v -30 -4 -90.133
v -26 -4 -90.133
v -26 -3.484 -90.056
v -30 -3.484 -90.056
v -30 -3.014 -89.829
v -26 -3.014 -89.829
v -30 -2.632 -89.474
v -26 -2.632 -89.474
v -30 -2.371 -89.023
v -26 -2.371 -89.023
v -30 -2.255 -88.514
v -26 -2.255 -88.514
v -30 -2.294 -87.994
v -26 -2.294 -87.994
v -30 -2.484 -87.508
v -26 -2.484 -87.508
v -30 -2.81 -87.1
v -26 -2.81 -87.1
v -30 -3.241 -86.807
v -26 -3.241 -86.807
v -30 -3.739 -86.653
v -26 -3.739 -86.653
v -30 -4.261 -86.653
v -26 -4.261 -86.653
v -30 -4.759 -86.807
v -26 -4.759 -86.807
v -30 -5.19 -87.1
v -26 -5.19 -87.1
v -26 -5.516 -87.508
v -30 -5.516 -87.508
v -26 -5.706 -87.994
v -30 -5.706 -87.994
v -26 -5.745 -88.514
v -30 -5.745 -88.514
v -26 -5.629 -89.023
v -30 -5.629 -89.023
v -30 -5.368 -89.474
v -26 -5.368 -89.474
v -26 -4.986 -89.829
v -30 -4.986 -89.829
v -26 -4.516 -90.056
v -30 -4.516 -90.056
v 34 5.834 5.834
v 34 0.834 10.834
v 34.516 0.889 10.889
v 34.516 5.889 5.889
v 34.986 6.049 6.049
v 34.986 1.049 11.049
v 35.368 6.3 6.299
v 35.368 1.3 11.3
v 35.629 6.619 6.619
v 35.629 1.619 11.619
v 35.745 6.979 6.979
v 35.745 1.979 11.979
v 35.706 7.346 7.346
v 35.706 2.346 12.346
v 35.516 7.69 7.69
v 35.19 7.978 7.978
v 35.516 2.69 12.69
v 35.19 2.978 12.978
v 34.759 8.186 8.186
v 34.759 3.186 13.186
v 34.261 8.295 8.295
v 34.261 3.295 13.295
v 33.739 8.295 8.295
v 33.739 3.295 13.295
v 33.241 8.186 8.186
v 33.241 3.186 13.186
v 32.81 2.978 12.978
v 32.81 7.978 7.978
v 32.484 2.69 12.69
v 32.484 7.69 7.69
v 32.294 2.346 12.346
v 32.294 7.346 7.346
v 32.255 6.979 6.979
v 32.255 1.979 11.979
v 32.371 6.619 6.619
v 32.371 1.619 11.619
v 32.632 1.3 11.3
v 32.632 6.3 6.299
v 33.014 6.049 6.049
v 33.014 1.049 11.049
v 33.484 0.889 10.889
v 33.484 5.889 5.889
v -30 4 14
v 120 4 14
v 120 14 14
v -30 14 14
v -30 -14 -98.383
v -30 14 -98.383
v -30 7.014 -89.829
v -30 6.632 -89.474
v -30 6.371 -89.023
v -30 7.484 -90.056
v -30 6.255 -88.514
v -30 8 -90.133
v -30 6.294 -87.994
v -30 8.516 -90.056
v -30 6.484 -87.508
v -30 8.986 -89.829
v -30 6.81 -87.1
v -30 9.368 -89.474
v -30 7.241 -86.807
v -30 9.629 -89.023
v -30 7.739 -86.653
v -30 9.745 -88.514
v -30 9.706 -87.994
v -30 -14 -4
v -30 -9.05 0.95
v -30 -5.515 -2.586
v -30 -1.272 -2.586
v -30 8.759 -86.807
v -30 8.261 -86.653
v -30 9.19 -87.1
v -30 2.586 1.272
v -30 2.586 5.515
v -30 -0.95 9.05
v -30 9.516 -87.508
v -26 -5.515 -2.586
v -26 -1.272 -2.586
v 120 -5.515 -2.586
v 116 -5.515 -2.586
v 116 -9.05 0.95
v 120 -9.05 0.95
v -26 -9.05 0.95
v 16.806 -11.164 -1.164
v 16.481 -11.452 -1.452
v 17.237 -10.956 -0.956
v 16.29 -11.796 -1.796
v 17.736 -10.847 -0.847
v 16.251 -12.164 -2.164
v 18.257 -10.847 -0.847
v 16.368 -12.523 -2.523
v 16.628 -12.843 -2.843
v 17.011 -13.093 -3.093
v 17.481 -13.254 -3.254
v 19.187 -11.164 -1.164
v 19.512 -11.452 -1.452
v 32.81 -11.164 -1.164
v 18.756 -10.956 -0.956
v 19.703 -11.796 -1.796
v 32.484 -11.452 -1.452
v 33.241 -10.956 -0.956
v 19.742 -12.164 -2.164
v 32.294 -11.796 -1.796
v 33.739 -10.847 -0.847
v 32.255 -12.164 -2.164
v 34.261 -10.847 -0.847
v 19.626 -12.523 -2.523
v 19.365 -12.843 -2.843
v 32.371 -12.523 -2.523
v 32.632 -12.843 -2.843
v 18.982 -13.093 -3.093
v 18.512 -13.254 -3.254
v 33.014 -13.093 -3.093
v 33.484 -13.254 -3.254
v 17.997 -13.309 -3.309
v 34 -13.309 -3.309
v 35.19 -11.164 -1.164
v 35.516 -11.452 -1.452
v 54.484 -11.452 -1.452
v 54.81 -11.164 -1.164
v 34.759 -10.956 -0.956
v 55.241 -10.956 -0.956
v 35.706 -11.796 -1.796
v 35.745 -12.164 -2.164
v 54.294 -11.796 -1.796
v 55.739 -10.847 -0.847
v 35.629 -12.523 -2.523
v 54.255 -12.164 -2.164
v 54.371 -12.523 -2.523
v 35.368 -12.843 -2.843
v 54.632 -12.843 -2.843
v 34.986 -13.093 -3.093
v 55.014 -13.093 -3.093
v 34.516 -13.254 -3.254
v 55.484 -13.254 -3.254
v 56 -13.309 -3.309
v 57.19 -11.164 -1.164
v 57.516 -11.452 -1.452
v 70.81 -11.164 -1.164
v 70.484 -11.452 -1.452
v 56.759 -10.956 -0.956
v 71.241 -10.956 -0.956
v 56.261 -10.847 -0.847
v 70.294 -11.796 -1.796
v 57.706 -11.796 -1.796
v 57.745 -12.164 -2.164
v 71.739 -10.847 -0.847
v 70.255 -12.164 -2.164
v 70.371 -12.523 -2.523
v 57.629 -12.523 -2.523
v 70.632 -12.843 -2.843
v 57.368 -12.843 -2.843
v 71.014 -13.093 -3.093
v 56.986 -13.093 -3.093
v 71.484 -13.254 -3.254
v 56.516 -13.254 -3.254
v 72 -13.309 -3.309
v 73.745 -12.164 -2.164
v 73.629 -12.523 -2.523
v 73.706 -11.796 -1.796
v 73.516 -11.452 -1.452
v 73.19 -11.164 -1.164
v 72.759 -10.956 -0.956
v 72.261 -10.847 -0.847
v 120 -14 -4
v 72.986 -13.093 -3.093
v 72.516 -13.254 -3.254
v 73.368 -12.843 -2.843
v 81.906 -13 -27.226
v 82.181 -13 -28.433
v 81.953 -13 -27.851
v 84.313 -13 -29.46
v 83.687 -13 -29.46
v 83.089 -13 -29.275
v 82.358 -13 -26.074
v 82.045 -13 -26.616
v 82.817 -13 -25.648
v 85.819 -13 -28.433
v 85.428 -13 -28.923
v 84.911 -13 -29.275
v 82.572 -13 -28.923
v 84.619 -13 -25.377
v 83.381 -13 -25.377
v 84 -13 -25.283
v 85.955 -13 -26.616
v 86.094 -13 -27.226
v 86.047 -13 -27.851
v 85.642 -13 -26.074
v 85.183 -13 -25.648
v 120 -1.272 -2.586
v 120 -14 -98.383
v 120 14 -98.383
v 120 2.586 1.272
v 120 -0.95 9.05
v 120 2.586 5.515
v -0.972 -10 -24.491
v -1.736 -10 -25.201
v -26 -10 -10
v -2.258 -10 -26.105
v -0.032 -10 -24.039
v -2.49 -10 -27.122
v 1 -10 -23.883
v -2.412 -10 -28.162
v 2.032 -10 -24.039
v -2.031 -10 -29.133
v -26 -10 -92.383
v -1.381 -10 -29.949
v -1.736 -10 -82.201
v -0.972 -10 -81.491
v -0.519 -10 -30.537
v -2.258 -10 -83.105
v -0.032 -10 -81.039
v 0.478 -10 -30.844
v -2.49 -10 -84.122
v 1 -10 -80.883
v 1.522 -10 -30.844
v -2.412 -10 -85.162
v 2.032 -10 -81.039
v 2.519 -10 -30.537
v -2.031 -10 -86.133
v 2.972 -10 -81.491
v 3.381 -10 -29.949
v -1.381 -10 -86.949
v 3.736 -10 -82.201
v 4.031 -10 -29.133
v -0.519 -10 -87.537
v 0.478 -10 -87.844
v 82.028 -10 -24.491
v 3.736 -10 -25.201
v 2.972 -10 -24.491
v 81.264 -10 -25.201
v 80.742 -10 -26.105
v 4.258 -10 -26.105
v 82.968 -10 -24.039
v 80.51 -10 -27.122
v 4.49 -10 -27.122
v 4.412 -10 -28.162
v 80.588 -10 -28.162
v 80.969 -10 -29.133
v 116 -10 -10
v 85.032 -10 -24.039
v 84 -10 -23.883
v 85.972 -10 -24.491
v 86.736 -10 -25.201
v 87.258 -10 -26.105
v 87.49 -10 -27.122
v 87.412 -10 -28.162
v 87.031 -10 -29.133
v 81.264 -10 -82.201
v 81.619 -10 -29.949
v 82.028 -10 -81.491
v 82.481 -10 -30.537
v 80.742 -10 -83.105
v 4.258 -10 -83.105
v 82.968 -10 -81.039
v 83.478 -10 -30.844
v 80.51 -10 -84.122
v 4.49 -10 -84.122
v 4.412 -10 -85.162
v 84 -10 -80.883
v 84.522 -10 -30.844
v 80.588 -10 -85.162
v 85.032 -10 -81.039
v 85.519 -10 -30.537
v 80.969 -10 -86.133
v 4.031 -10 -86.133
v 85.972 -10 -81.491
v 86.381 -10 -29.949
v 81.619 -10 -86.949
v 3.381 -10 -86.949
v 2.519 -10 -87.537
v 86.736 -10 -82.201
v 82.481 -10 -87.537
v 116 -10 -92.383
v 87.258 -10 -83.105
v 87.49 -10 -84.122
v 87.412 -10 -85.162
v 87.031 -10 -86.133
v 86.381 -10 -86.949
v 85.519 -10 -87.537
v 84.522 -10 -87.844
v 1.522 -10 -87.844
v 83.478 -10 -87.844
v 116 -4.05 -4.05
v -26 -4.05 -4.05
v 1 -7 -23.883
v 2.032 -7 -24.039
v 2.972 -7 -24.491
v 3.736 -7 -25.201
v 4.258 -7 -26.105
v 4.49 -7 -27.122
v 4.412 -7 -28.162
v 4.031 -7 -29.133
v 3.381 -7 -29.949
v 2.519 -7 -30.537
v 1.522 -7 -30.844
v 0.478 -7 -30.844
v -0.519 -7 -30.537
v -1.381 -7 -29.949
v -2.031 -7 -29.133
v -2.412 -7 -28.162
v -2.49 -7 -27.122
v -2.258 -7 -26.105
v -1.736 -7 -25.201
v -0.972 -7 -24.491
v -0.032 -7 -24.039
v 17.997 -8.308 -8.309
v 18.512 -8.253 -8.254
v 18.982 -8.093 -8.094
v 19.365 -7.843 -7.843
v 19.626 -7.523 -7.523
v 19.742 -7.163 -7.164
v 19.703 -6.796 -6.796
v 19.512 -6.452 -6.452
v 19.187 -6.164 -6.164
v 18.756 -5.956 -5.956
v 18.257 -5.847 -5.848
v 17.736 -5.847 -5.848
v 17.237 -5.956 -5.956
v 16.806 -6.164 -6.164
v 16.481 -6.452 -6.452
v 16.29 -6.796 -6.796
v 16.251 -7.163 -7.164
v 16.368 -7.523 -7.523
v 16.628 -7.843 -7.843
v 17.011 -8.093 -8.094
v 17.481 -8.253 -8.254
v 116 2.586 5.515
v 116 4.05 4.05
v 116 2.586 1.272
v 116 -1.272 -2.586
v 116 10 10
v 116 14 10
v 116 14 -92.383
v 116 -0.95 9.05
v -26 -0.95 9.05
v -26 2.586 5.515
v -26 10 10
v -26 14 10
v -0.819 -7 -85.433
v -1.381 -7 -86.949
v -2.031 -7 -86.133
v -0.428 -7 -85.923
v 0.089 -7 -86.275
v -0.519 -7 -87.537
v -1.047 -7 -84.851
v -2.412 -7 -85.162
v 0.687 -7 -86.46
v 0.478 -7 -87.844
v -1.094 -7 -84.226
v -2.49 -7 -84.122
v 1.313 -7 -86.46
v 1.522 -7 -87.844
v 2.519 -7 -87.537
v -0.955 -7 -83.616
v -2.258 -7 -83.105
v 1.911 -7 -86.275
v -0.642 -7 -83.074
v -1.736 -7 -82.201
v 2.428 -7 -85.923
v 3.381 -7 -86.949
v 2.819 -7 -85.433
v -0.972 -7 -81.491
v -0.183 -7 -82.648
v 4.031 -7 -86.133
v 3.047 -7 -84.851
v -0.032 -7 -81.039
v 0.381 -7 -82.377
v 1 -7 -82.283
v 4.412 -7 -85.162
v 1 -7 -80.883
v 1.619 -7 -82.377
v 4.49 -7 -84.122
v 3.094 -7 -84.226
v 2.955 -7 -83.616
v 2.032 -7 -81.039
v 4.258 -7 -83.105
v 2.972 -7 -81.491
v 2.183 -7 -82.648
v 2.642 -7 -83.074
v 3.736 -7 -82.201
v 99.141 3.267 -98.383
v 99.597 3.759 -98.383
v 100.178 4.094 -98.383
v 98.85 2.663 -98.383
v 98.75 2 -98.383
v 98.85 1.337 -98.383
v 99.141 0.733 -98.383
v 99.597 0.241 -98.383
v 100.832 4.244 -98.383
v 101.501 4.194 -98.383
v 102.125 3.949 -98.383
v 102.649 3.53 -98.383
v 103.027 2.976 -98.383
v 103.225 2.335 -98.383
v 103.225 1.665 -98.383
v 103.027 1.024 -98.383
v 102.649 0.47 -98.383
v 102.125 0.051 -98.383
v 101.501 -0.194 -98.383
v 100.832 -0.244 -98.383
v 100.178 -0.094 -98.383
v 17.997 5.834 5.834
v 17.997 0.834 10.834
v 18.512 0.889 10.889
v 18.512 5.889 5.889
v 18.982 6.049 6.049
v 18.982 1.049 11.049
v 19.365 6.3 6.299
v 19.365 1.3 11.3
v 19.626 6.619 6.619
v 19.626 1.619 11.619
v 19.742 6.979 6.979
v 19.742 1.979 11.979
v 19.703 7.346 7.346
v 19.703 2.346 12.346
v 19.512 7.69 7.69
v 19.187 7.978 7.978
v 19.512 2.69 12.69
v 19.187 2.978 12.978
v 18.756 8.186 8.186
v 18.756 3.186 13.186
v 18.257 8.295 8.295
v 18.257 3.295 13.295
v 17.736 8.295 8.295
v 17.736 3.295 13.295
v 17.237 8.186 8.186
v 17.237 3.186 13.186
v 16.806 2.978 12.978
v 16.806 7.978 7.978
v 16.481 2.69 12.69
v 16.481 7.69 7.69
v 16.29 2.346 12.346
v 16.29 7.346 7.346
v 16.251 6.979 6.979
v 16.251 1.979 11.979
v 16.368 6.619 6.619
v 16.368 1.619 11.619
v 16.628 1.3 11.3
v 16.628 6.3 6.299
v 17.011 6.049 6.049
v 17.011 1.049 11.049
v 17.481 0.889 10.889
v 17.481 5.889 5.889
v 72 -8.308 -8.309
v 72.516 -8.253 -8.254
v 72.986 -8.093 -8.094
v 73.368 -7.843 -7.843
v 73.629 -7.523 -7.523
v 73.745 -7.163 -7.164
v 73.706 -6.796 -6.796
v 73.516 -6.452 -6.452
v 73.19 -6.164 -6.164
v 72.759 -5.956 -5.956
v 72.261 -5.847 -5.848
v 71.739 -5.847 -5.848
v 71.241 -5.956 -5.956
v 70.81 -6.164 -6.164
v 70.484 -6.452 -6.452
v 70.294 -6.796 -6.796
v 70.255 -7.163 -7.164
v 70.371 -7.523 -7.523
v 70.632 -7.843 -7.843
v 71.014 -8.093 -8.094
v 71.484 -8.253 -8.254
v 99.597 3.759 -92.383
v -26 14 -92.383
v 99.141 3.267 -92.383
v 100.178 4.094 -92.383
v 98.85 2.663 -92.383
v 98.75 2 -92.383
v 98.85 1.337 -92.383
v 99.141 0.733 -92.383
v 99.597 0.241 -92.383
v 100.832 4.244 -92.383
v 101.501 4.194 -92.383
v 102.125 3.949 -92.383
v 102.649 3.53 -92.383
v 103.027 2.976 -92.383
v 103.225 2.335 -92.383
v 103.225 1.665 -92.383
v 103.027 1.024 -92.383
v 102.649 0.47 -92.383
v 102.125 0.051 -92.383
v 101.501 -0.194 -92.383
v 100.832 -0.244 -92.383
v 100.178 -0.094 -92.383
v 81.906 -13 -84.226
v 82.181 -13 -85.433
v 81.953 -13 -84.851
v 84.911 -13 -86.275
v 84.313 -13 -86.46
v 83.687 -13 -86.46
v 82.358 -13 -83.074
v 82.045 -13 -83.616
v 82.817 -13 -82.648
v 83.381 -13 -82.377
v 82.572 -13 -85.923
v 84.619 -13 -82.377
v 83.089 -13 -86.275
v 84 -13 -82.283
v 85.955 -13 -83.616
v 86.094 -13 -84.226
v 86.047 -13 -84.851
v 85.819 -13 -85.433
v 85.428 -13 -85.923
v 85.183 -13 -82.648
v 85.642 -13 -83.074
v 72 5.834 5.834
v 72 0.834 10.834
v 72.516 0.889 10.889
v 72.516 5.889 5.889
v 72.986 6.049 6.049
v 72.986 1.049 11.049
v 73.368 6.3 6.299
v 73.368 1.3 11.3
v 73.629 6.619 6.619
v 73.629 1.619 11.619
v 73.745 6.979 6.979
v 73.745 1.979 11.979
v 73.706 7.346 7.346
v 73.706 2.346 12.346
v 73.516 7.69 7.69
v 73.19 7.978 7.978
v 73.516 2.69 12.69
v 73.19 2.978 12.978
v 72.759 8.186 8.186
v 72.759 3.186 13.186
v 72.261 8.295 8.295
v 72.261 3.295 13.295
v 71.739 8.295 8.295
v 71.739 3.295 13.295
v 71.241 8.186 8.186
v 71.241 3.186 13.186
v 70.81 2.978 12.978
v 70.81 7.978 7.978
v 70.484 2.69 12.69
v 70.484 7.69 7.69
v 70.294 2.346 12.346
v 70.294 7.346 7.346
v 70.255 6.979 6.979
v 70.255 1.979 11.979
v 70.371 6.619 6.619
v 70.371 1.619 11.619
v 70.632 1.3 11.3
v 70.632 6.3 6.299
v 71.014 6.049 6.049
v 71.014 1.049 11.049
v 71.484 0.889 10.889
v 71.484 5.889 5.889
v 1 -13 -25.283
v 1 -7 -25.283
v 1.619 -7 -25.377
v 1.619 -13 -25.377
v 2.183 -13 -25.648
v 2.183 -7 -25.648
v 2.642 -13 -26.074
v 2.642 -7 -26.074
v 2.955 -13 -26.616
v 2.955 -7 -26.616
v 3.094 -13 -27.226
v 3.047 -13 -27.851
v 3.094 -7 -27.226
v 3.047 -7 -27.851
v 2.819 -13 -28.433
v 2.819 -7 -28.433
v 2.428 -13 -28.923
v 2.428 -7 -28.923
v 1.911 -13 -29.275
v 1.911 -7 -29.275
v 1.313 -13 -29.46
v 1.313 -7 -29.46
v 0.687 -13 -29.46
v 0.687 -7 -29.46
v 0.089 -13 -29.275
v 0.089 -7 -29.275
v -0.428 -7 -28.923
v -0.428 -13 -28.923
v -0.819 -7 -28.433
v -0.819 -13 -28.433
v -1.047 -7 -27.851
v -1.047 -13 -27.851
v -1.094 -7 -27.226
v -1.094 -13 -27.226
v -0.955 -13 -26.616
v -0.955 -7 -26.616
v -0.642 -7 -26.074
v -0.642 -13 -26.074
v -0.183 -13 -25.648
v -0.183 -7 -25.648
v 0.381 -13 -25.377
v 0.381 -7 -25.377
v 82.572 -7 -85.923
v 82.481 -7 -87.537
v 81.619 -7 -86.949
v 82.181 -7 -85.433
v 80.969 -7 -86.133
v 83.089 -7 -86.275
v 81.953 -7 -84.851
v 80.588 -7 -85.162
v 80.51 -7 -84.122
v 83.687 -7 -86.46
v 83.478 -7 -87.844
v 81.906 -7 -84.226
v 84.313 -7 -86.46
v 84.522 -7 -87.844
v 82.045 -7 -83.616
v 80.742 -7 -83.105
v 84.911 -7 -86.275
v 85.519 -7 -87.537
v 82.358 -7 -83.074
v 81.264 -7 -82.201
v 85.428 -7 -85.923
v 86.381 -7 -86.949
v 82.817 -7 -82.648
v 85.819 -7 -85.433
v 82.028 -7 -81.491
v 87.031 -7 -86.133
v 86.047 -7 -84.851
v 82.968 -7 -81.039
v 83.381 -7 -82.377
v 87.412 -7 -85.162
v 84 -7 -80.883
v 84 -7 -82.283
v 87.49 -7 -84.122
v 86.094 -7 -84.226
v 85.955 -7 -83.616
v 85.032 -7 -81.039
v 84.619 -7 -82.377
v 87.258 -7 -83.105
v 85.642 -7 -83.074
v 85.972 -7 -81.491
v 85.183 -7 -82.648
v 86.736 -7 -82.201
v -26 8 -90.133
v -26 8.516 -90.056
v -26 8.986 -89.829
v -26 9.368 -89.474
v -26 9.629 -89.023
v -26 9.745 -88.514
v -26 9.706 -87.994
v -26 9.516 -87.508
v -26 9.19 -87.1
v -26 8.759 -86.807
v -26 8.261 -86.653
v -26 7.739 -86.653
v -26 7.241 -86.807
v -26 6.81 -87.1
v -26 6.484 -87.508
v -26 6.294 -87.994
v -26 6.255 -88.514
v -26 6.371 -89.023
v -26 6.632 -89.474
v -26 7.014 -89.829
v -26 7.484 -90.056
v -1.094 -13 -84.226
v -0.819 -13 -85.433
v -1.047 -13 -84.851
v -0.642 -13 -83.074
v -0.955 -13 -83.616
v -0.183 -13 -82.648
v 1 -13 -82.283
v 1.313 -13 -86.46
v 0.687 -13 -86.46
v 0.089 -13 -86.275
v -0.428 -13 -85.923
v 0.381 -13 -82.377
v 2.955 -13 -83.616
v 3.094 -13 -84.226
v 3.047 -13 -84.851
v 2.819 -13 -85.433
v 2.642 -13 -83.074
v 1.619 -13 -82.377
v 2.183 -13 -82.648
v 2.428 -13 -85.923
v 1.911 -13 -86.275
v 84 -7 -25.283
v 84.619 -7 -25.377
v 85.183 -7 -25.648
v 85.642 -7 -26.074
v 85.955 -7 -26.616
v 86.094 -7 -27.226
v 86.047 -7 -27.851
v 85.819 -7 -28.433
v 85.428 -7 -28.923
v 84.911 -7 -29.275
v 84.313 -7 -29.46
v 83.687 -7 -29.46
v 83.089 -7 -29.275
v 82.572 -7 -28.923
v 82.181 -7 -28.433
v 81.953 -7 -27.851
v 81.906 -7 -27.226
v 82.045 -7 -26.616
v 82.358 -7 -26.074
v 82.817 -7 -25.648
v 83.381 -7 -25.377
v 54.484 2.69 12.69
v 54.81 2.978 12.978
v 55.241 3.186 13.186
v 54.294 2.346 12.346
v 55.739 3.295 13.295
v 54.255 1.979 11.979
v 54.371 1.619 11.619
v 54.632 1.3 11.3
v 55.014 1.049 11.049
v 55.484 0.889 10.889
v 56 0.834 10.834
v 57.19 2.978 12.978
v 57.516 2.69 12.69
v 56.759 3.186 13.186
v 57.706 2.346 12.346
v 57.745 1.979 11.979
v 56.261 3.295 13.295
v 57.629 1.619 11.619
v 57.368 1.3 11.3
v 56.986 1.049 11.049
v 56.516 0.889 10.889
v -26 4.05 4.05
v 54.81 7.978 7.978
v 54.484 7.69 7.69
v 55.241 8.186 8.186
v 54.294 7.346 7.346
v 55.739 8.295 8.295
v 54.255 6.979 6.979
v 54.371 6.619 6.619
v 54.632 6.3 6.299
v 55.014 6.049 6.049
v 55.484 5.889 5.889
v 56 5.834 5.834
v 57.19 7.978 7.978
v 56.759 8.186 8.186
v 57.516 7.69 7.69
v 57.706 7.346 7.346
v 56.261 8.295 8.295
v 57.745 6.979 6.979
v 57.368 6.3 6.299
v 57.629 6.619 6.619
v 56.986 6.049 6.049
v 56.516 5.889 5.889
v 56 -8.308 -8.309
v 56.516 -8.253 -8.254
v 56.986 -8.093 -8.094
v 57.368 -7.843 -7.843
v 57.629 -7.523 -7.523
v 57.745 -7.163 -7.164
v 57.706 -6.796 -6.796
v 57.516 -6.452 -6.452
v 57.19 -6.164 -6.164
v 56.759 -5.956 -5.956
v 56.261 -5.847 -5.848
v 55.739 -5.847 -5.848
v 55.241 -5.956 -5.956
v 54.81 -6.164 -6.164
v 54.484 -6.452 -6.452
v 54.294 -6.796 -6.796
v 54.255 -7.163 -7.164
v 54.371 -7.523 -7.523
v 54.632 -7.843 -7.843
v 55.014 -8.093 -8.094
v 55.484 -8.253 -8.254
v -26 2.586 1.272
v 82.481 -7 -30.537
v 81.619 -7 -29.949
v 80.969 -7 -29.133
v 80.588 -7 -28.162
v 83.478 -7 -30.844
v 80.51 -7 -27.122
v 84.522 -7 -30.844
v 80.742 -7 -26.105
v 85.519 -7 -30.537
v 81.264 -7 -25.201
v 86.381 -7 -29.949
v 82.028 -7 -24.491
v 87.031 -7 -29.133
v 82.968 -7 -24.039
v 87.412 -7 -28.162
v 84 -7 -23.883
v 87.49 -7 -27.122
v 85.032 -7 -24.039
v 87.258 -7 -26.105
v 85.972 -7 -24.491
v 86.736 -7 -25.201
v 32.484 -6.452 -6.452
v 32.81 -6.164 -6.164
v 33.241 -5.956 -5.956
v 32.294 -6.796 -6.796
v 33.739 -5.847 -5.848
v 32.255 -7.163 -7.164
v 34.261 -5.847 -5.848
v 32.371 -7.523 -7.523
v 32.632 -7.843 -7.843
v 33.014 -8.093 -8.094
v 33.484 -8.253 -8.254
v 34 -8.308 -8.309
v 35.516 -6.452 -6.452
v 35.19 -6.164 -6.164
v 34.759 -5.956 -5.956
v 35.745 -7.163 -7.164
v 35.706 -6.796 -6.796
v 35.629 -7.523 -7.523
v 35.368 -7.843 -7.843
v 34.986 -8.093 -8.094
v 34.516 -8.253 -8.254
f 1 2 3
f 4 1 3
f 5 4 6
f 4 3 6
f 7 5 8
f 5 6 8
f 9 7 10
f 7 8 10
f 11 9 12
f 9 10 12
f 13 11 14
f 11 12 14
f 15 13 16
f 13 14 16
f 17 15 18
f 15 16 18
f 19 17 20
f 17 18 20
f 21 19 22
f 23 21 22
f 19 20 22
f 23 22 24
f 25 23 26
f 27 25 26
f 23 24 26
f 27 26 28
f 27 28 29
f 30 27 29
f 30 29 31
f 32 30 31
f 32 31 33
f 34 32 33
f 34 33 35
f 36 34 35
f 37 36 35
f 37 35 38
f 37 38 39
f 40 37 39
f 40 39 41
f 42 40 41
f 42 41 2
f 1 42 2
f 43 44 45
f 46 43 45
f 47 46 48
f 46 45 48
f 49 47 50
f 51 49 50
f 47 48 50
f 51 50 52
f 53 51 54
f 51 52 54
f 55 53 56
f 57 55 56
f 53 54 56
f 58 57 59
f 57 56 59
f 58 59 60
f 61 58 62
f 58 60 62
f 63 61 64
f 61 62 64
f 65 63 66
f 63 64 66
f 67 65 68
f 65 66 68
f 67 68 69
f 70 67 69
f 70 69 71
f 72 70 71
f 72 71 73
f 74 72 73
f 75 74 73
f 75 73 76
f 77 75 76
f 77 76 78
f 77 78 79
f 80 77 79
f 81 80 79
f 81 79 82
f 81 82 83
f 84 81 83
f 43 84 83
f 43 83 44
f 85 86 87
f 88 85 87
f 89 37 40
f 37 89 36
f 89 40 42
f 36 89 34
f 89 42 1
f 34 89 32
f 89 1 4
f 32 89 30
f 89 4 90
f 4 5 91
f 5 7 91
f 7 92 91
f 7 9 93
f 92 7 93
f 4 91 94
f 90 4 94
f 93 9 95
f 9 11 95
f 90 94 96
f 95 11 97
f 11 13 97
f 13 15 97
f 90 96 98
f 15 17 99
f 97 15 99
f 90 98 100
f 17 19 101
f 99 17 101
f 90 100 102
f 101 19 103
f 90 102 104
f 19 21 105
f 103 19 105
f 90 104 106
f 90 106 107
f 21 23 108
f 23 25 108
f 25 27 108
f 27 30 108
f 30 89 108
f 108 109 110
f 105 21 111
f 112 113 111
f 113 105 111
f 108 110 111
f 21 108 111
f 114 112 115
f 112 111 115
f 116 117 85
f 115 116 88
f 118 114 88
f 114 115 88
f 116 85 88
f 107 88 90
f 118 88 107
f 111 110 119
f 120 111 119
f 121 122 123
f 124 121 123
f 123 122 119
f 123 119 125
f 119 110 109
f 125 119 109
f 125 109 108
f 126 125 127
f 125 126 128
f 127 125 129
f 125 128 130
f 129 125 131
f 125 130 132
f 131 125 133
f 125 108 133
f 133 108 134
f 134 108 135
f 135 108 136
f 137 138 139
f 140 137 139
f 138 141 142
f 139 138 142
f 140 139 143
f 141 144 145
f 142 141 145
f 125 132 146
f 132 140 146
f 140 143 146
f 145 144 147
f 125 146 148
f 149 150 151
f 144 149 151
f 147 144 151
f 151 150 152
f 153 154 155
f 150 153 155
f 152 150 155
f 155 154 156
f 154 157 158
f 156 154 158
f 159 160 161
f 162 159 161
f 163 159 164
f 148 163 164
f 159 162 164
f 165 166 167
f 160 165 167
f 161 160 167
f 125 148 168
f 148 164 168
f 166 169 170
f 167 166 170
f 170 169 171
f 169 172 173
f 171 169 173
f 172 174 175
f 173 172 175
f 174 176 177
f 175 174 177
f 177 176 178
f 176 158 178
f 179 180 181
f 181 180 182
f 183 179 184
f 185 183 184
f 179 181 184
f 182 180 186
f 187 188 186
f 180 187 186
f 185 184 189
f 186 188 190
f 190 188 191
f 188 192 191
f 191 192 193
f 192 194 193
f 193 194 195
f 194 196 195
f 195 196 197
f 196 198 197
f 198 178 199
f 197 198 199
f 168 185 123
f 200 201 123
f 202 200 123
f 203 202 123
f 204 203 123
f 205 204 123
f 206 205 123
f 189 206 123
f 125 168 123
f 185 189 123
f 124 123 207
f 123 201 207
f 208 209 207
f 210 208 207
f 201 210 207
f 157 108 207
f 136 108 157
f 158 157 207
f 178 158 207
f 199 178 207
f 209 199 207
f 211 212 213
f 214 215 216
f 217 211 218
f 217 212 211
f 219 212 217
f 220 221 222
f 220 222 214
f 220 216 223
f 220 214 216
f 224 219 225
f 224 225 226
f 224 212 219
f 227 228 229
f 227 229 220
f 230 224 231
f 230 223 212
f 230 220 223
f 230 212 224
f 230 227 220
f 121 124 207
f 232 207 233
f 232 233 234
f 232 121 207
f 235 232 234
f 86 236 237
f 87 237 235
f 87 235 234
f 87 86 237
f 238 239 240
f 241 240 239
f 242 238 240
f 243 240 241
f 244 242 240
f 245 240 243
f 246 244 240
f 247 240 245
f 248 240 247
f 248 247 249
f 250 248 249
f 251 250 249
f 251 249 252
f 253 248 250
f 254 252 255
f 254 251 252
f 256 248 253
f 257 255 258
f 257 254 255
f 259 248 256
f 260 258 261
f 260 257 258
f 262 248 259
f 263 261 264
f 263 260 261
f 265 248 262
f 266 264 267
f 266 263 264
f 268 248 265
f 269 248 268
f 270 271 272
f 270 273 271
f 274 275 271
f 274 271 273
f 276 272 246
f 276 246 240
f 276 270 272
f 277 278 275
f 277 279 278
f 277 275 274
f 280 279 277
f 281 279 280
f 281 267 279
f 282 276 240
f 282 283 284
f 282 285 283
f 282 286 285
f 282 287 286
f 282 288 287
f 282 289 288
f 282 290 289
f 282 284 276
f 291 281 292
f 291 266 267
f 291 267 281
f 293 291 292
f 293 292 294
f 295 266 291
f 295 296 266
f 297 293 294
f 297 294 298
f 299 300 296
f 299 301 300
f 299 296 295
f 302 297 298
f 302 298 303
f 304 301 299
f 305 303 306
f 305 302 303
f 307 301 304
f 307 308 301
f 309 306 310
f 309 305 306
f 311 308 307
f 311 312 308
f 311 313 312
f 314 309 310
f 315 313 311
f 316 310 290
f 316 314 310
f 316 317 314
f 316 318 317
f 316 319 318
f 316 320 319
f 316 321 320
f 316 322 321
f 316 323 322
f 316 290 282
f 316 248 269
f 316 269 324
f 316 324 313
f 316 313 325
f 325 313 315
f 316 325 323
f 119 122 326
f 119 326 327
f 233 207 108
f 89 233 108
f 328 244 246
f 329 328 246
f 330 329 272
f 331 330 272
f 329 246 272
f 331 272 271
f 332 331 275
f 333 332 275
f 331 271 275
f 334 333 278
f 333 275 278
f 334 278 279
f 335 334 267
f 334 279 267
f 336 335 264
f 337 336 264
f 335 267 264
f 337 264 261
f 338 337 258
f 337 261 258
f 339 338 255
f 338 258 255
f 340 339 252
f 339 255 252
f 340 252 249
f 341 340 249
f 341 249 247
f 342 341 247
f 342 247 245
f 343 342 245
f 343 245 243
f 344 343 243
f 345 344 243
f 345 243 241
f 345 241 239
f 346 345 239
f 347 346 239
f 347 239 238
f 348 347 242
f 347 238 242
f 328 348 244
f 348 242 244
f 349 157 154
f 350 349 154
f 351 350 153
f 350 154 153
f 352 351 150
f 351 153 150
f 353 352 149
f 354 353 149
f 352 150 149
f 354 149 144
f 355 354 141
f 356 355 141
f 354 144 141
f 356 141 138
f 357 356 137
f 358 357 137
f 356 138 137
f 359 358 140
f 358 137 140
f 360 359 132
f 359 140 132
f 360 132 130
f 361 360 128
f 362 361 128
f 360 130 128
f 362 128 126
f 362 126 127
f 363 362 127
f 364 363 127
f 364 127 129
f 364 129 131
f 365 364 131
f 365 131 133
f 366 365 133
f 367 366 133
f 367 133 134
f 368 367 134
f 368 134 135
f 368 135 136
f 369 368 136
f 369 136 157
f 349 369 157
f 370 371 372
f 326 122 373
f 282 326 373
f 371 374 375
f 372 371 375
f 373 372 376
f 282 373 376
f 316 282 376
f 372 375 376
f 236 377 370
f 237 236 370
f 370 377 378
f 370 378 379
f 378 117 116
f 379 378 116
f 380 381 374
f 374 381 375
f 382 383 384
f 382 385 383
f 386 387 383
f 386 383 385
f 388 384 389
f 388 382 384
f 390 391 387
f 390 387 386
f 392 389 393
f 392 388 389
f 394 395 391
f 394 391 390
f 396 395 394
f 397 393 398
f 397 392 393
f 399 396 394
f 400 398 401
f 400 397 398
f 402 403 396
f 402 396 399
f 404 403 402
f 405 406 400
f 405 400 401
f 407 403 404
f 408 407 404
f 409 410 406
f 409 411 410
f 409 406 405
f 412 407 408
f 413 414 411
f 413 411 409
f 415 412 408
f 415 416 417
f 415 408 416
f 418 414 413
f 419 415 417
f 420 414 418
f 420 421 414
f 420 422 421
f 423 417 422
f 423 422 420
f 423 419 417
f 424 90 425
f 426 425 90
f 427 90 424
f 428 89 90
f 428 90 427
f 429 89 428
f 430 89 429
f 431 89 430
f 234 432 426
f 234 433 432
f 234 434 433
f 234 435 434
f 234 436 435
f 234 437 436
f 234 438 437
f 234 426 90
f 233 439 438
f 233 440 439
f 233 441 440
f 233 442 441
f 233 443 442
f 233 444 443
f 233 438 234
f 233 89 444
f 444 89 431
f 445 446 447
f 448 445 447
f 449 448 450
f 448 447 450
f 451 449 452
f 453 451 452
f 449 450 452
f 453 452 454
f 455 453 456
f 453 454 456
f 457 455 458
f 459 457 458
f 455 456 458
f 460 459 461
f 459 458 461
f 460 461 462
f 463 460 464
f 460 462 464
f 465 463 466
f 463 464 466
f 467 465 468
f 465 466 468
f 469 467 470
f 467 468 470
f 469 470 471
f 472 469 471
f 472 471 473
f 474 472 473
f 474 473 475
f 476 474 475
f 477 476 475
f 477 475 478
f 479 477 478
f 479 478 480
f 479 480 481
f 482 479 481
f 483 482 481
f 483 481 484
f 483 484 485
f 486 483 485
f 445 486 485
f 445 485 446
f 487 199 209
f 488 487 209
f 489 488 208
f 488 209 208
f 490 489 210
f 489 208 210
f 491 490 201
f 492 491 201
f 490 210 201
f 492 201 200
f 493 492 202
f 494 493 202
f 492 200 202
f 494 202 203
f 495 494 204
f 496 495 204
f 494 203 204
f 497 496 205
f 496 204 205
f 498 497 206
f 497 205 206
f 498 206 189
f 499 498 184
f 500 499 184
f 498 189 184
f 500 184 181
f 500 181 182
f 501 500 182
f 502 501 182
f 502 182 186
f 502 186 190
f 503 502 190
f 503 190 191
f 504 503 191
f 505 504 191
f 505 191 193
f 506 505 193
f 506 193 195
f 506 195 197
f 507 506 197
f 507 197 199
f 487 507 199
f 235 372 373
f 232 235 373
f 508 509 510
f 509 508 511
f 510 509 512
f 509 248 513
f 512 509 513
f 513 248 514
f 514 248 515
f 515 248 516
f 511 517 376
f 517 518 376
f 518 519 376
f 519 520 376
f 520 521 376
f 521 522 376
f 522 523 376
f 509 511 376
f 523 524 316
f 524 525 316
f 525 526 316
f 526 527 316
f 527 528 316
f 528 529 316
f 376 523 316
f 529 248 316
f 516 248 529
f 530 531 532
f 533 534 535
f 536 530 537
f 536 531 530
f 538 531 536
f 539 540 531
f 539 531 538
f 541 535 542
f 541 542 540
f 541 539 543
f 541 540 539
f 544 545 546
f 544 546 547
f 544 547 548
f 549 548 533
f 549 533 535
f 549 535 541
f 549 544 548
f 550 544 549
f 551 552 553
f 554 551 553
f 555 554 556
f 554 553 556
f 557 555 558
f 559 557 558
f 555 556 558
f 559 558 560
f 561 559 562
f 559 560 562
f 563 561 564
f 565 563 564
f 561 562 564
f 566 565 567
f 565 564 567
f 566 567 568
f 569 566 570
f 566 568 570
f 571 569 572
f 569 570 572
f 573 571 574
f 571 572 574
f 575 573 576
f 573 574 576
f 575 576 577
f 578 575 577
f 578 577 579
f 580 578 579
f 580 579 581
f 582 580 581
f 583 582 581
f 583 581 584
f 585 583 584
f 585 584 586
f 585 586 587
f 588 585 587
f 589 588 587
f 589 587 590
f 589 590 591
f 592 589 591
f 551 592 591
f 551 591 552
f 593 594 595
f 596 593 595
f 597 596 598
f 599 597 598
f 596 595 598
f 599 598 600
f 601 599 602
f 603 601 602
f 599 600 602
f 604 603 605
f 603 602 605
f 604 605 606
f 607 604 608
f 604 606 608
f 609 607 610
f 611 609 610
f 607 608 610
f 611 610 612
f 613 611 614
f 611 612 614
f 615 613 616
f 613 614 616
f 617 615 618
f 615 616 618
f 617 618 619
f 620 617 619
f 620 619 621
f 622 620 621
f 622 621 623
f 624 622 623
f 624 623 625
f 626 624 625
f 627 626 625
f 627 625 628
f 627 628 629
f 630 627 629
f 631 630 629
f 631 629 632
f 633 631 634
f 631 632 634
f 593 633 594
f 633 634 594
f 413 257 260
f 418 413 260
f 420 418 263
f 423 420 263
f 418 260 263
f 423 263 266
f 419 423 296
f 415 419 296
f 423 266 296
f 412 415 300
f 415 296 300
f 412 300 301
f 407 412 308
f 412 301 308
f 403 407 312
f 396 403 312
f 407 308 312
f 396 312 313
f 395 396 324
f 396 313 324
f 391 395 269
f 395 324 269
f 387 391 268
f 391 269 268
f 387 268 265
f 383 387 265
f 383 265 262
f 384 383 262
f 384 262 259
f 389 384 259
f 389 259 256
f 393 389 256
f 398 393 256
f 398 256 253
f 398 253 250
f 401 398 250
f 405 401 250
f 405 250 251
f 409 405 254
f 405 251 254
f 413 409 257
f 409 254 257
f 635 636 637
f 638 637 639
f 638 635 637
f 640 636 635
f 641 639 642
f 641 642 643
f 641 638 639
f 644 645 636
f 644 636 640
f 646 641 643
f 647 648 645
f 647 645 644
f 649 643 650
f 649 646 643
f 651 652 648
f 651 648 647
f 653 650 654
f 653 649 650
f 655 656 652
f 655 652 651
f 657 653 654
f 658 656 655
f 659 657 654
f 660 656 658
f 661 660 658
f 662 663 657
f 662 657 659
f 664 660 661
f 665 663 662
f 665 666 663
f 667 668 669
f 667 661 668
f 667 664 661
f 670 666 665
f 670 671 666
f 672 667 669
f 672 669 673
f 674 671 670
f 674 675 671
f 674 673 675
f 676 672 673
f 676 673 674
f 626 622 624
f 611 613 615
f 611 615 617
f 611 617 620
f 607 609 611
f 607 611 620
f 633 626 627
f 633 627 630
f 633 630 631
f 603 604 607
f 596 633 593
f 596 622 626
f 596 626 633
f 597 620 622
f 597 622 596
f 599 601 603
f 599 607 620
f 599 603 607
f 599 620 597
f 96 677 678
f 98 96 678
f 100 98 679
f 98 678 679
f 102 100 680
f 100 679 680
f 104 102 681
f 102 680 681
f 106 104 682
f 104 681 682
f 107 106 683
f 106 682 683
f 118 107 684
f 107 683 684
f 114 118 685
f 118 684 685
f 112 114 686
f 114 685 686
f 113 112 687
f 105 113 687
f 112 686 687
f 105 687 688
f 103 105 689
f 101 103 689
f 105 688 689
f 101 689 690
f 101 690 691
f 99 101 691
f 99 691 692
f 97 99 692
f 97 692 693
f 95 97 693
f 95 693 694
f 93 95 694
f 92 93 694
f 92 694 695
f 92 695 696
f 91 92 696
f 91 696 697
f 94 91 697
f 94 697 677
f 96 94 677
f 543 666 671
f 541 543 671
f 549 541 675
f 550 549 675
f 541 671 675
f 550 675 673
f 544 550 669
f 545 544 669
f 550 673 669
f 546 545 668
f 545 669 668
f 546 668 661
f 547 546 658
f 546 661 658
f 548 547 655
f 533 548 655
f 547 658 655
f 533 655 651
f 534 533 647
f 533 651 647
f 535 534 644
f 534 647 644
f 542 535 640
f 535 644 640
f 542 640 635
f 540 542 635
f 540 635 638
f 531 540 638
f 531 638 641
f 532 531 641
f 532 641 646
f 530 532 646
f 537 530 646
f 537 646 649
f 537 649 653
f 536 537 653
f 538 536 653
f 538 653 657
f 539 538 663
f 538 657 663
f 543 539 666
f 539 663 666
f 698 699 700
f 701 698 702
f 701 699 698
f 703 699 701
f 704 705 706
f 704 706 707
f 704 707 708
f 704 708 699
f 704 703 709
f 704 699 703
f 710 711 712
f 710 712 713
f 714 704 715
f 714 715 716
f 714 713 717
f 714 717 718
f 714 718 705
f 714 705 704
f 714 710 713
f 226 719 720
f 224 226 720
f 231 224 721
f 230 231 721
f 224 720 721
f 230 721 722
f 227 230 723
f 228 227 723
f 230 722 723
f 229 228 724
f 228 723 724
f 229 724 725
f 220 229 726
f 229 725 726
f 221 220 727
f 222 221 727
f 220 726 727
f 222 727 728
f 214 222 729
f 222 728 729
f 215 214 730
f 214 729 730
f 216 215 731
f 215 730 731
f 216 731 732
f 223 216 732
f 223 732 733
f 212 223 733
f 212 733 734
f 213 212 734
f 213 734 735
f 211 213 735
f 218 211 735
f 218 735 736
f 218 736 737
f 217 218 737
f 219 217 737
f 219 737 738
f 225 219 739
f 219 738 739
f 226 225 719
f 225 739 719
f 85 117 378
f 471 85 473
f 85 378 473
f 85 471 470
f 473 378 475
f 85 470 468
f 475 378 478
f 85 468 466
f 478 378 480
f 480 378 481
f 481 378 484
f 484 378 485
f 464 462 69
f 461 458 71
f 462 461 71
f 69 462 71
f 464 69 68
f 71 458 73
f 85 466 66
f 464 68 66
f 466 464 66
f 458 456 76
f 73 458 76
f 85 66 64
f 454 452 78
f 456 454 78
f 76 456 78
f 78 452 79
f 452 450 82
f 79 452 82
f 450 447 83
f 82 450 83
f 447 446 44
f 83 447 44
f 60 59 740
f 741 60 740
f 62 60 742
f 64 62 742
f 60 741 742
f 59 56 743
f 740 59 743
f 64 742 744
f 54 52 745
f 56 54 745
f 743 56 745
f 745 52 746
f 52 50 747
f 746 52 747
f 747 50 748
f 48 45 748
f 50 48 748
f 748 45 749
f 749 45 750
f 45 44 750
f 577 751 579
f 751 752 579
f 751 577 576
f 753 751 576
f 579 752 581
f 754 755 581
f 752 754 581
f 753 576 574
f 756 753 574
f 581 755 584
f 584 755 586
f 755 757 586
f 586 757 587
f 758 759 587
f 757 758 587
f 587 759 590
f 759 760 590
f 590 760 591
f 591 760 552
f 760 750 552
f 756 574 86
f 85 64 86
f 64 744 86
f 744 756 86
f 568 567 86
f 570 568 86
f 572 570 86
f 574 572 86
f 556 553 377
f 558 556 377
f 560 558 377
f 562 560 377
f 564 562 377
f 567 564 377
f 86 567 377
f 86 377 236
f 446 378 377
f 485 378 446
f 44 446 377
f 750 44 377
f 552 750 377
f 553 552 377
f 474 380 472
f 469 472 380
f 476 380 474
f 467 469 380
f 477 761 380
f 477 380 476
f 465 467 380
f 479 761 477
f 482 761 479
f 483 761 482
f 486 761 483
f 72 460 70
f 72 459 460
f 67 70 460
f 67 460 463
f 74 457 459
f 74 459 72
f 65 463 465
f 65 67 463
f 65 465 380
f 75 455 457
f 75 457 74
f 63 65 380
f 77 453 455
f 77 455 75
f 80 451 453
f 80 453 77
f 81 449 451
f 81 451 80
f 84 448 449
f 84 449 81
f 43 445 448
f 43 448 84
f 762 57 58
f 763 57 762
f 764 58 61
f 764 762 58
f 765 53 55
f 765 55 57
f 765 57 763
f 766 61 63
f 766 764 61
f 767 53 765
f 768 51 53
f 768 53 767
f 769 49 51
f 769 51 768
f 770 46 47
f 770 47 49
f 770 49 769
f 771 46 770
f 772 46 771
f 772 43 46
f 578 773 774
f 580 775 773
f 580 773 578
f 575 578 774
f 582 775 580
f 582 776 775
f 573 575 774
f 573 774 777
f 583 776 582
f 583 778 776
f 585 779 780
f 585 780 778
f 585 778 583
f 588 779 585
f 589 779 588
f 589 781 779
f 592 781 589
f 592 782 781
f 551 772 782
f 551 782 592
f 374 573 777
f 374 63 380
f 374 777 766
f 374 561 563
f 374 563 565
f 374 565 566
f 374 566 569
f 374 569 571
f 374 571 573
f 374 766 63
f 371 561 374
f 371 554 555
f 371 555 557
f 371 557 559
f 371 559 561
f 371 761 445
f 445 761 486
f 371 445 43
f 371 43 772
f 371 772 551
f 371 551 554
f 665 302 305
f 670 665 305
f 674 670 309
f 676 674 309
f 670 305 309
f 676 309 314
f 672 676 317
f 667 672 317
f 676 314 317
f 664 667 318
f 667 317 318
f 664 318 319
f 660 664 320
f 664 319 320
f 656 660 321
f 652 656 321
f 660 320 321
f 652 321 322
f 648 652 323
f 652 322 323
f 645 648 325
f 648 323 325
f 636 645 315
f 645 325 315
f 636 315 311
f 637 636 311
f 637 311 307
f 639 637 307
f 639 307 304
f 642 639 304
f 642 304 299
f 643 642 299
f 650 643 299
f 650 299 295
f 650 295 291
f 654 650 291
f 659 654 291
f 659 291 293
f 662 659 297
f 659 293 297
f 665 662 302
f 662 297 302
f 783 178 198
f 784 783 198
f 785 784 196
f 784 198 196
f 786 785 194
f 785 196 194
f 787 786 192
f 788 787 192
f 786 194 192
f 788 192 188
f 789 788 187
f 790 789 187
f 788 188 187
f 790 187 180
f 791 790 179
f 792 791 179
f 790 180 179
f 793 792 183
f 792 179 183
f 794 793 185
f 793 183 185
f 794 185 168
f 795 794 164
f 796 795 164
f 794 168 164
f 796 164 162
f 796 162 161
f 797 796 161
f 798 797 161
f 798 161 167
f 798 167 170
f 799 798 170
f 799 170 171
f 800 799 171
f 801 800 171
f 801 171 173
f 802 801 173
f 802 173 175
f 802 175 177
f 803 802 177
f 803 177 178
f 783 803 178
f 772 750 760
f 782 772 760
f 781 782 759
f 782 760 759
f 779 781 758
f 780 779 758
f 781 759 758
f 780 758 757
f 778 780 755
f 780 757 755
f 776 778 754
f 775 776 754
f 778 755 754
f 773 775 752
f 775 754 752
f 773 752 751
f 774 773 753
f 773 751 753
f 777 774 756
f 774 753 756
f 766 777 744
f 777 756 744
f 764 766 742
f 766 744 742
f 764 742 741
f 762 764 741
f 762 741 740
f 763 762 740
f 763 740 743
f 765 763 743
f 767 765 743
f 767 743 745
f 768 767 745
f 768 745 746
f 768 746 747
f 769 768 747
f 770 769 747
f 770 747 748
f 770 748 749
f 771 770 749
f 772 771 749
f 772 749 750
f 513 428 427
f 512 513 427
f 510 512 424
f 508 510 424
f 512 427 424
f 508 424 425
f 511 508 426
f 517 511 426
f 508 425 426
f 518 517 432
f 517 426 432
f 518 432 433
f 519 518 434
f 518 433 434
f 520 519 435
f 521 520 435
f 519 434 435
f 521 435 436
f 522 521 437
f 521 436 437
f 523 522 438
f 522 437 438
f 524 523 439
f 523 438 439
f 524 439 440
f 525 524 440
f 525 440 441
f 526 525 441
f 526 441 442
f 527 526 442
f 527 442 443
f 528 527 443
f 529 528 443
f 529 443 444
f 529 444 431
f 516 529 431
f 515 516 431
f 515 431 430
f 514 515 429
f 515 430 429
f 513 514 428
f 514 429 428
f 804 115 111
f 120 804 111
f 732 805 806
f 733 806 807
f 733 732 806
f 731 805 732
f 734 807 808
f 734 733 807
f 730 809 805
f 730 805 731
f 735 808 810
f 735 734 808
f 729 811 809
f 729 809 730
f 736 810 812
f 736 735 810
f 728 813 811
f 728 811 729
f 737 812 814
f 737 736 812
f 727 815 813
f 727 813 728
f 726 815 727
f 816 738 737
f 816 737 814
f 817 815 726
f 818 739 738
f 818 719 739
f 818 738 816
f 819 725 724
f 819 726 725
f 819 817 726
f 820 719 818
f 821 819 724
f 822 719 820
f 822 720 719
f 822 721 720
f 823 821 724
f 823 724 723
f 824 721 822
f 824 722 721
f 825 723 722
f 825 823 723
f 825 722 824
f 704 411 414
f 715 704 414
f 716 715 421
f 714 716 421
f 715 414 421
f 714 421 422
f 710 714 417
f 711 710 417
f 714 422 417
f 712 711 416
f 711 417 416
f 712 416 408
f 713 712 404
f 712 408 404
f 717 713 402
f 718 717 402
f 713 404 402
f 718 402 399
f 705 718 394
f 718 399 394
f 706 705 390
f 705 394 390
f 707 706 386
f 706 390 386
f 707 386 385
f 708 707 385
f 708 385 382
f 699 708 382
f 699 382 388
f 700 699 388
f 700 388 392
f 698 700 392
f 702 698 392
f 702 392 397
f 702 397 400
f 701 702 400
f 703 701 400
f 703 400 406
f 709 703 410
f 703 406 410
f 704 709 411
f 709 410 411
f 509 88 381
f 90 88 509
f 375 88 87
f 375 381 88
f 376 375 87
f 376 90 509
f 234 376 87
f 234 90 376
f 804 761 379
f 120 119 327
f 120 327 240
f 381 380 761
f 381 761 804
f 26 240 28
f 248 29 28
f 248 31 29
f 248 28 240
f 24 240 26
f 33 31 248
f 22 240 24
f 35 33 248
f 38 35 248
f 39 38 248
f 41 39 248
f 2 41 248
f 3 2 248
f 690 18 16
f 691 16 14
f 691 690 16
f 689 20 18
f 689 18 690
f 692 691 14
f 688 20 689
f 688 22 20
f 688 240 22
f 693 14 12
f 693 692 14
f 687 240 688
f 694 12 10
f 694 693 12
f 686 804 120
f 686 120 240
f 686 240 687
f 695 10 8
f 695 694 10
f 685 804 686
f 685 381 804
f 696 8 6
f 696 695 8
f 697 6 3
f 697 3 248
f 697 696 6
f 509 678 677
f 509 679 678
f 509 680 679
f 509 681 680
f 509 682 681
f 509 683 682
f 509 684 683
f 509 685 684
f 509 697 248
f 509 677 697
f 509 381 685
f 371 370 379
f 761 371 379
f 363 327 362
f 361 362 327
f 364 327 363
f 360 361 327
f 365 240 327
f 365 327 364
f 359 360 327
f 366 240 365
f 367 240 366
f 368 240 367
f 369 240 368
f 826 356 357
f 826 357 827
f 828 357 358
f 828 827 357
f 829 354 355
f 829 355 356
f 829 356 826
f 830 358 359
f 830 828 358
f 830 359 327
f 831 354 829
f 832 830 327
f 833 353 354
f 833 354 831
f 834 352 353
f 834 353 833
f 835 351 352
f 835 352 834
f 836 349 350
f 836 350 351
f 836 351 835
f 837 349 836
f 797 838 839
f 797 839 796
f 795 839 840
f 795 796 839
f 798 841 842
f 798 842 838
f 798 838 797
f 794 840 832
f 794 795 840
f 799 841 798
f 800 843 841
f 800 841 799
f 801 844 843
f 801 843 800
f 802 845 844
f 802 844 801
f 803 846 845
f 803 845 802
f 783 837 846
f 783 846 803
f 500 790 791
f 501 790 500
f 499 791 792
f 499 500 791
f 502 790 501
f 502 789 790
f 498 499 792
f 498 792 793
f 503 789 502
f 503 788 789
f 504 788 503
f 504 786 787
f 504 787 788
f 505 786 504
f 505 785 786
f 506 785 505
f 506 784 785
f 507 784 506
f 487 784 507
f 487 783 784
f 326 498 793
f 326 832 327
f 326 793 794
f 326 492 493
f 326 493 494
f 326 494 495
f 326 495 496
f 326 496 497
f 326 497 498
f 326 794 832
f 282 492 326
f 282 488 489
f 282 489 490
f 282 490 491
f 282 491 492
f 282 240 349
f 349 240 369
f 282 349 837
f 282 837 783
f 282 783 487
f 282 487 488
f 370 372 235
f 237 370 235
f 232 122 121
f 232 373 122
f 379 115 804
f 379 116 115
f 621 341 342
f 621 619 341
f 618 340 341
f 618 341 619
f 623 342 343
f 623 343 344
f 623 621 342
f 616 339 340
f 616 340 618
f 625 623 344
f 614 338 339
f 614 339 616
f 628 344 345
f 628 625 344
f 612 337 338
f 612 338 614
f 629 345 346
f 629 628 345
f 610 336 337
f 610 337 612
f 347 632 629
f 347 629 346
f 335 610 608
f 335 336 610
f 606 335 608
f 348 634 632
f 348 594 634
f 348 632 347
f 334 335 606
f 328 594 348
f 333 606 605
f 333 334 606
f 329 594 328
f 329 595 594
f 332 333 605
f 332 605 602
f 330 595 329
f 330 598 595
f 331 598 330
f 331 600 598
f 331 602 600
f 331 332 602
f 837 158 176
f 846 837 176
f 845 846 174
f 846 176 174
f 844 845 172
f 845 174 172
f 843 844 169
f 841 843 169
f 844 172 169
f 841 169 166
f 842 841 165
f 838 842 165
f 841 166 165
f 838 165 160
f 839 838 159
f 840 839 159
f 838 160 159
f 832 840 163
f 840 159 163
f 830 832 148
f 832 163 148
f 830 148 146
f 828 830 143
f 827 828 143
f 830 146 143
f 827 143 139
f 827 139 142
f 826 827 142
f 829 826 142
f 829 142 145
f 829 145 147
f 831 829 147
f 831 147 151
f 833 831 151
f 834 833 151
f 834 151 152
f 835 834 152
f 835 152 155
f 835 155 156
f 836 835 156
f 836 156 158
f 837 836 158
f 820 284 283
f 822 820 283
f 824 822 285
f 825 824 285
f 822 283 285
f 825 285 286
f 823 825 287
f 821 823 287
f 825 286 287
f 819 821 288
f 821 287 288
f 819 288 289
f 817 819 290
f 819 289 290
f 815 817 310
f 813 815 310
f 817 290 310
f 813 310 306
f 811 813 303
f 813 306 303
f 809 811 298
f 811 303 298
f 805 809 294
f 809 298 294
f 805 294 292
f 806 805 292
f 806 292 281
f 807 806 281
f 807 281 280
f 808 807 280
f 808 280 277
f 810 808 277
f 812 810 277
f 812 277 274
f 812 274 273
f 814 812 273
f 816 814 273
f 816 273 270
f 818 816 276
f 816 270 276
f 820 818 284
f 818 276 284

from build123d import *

# Parameters (mm, degrees)
BOSS_EXTRUDE1_DEPTH      = 120
BOSS_EXTRUDE1_DEPTH_BACK = 30
SKETCH1_W                = 28
SKETCH1_H                = 28
CHAMFER1_SIZE            = 18
SKETCH2_W                = 150
SKETCH2_H                = 28
BOSS_EXTRUDE2_DEPTH      = 100
SKETCH3_W                = 142
SKETCH3_H                = 100
CUT_EXTRUDE1_DEPTH       = 24
SKETCH4_W                = 142
SKETCH4_H                = 20
CUT_EXTRUDE2_DEPTH       = 4
CHAMFER2_SIZE            = 20
SKETCH6_R                = 1.75
CUT_EXTRUDE3_DEPTH       = 171.064693573
SKETCH10_W               = 165.029573665
SKETCH10_H               = 25.818236019
CUT_EXTRUDE7_DEPTH       = 168.868996542
CUT_EXTRUDE8_DEPTH       = 180.931301028
CHAMFER3_SIZE            = 3
SKETCH12_W               = 142
SKETCH12_H               = 11.455844122
CUT_EXTRUDE9_DEPTH       = 160.52775952
SKETCH13_W               = 142
SKETCH13_H               = 6
BOSS_EXTRUDE4_DEPTH      = 24
SKETCH14_R               = 2.25
CUT_EXTRUDE10_DEPTH      = 6
SKETCH15_R               = 1.75
CUT_EXTRUDE11_DEPTH      = 177.610512398
SKETCH17_R               = 3.5
BOSS_EXTRUDE5_DEPTH      = 3
SKETCH18_R               = 2.1
CUT_EXTRUDE12_DEPTH      = 6


with BuildPart() as part:
    # Sketch1 → Boss-Extrude1 (new, two sides: drawn at the far end of the back side and taken through both)
    with BuildSketch(Plane(origin=(0, 0, 0), x_dir=(0, 0, -1), z_dir=(1, 0, 0)).offset(-BOSS_EXTRUDE1_DEPTH_BACK)):
        Rectangle(SKETCH1_W, SKETCH1_H)
    extrude(amount=BOSS_EXTRUDE1_DEPTH + BOSS_EXTRUDE1_DEPTH_BACK)

    # Chamfer1
    chamfer1_edges = [part.edges().sort_by_distance(p)[0] for p in [
        (45, -14, 14),
    ]]
    chamfer(chamfer1_edges, length=CHAMFER1_SIZE)

    # Sketch2 → Boss-Extrude2 (add)
    with BuildSketch(Plane(origin=(0, 0, -14), x_dir=(-1, 0, 0), z_dir=(0, 0, -1))):
        with Locations((-45, 0)):
            Rectangle(SKETCH2_W, SKETCH2_H)
    extrude(amount=BOSS_EXTRUDE2_DEPTH)

    # Sketch3 → Cut-Extrude1 (cut)
    with BuildSketch(Plane(origin=(0, 14, 0), x_dir=(1, 0, 0), z_dir=(0, 1, 0))):
        with Locations((45, 60)):
            Rectangle(SKETCH3_W, SKETCH3_H)
    extrude(amount=-CUT_EXTRUDE1_DEPTH, mode=Mode.SUBTRACT)

    # Sketch4 → Cut-Extrude2 (cut)
    with BuildSketch(Plane(origin=(0, 14, 0), x_dir=(1, 0, 0), z_dir=(0, 1, 0))):
        with Locations((45, 0)):
            Rectangle(SKETCH4_W, SKETCH4_H)
    extrude(amount=-CUT_EXTRUDE2_DEPTH, mode=Mode.SUBTRACT)

    # Chamfer2
    chamfer2_edges = [part.edges().sort_by_distance(p)[0] for p in [
        (45, 10, -10),
    ]]
    chamfer(chamfer2_edges, length=CHAMFER2_SIZE - 0.0001)  # a hair under: the kernel refuses the full size

    # Sketch6 → Cut-Extrude3 (cut, through all)
    with BuildSketch(Plane(origin=(0, -5, 5), x_dir=(1, 0, 0), z_dir=(0, -0.7071067811865465, 0.7071067811865487))):
        with Locations(Location((34, 10, 0), (0, 0, 270))):
            Circle(SKETCH6_R)
        with Locations(Location((17.996557672, 10, 0), (0, 0, 270))):
            Circle(SKETCH6_R)
        with Locations(Location((56, 10, 0), (0, 0, 270))):
            Circle(SKETCH6_R)
        with Locations(Location((72, 10, 0), (0, 0, 270))):
            Circle(SKETCH6_R)
        with Locations(Location((72, -10, 0), (0, 0, 270))):
            Circle(SKETCH6_R)
        with Locations(Location((56, -10, 0), (0, 0, 270))):
            Circle(SKETCH6_R)
        with Locations(Location((34, -10, 0), (0, 0, 270))):
            Circle(SKETCH6_R)
        with Locations(Location((17.996557672, -10, 0), (0, 0, 270))):
            Circle(SKETCH6_R)
    extrude(amount=-CUT_EXTRUDE3_DEPTH, mode=Mode.SUBTRACT)

    # Sketch10 → Cut-Extrude7 (cut, through all)
    with BuildSketch(Plane(origin=(0, 14, 0), x_dir=(1, 0, 0), z_dir=(0, 1, 0))):
        with Locations((52.514786833, 111.292414811)):
            Rectangle(SKETCH10_W, SKETCH10_H)
    extrude(amount=-CUT_EXTRUDE7_DEPTH, mode=Mode.SUBTRACT)

    # Sketch11 → Cut-Extrude8 (cut, through all)
    with BuildSketch(Plane.ZY.offset(30)):
        Polygon((9.050252532, -0.949747468), (3.393398282, 4.707106781), (-4.707106781, -3.393398282), (0.949747468, -9.050252532), align=None)
    extrude(amount=-CUT_EXTRUDE8_DEPTH, mode=Mode.SUBTRACT)

    # Chamfer3
    chamfer3_edges = [part.edges().sort_by_distance(p)[0] for p in [
        (-28, 4.707106781, 3.393398282),
        (-28, -3.393398282, -4.707106781),
    ]]
    chamfer(chamfer3_edges, length=CHAMFER3_SIZE)

    # Sketch12 → Cut-Extrude9 (cut, through all)
    with BuildSketch(Plane(origin=(0, -5, 5), x_dir=(-1, 0, 0), z_dir=(0, -0.7071067811865513, 0.7071067811865437))):
        with Locations((-45, 0)):
            Rectangle(SKETCH12_W, SKETCH12_H)
    extrude(amount=-CUT_EXTRUDE9_DEPTH, mode=Mode.SUBTRACT)

    # Sketch13 → Boss-Extrude4 (add)
    with BuildSketch(Plane(origin=(0, -10, 0), x_dir=(1, 0, 0), z_dir=(0, 1, 0))):
        with Locations((45, 95.383296801)):
            Rectangle(SKETCH13_W, SKETCH13_H)
    extrude(amount=BOSS_EXTRUDE4_DEPTH)

    # Sketch14 → Cut-Extrude10 (cut)
    with BuildSketch(Plane(origin=(0, 0, -98.383296801), x_dir=(-1, 0, 0), z_dir=(0, 0, -1))):
        with Locations((-101, 2)):
            Circle(SKETCH14_R)
    extrude(amount=-CUT_EXTRUDE10_DEPTH, mode=Mode.SUBTRACT)

    # Sketch15 → Cut-Extrude11 (cut, through all)
    with BuildSketch(Plane(origin=(-26, 0, 0), x_dir=(0, 0, -1), z_dir=(1, 0, 0))):
        with Locations((88.383296801, 8)):
            Circle(SKETCH15_R)
        with Locations((88.383296801, -4)):
            Circle(SKETCH15_R)
    extrude(amount=-CUT_EXTRUDE11_DEPTH, mode=Mode.SUBTRACT)

    # Sketch17 → Boss-Extrude5 (add)
    with BuildSketch(Plane(origin=(0, -10, 0), x_dir=(1, 0, 0), z_dir=(0, 1, 0))):
        with Locations(Location((1, 84.383296801, 0), (0, 0, 270))):
            Circle(SKETCH17_R)
        with Locations(Location((84, 84.383296801, 0), (0, 0, 270))):
            Circle(SKETCH17_R)
        with Locations(Location((84, 27.383296801, 0), (0, 0, 270))):
            Circle(SKETCH17_R)
        with Locations(Location((1, 27.383296801, 0), (0, 0, 270))):
            Circle(SKETCH17_R)
    extrude(amount=BOSS_EXTRUDE5_DEPTH)

    # Sketch18 → Cut-Extrude12 (cut)
    with BuildSketch(Plane(origin=(0, -7, 0), x_dir=(1, 0, 0), z_dir=(0, 1, 0))):
        with Locations(Location((84, 84.383296801, 0), (0, 0, 270))):
            Circle(SKETCH18_R)
        with Locations(Location((84, 27.383296801, 0), (0, 0, 270))):
            Circle(SKETCH18_R)
        with Locations(Location((1, 27.383296801, 0), (0, 0, 270))):
            Circle(SKETCH18_R)
        with Locations(Location((1, 84.383296801, 0), (0, 0, 270))):
            Circle(SKETCH18_R)
    extrude(amount=-CUT_EXTRUDE12_DEPTH, mode=Mode.SUBTRACT)


solid = part.part
